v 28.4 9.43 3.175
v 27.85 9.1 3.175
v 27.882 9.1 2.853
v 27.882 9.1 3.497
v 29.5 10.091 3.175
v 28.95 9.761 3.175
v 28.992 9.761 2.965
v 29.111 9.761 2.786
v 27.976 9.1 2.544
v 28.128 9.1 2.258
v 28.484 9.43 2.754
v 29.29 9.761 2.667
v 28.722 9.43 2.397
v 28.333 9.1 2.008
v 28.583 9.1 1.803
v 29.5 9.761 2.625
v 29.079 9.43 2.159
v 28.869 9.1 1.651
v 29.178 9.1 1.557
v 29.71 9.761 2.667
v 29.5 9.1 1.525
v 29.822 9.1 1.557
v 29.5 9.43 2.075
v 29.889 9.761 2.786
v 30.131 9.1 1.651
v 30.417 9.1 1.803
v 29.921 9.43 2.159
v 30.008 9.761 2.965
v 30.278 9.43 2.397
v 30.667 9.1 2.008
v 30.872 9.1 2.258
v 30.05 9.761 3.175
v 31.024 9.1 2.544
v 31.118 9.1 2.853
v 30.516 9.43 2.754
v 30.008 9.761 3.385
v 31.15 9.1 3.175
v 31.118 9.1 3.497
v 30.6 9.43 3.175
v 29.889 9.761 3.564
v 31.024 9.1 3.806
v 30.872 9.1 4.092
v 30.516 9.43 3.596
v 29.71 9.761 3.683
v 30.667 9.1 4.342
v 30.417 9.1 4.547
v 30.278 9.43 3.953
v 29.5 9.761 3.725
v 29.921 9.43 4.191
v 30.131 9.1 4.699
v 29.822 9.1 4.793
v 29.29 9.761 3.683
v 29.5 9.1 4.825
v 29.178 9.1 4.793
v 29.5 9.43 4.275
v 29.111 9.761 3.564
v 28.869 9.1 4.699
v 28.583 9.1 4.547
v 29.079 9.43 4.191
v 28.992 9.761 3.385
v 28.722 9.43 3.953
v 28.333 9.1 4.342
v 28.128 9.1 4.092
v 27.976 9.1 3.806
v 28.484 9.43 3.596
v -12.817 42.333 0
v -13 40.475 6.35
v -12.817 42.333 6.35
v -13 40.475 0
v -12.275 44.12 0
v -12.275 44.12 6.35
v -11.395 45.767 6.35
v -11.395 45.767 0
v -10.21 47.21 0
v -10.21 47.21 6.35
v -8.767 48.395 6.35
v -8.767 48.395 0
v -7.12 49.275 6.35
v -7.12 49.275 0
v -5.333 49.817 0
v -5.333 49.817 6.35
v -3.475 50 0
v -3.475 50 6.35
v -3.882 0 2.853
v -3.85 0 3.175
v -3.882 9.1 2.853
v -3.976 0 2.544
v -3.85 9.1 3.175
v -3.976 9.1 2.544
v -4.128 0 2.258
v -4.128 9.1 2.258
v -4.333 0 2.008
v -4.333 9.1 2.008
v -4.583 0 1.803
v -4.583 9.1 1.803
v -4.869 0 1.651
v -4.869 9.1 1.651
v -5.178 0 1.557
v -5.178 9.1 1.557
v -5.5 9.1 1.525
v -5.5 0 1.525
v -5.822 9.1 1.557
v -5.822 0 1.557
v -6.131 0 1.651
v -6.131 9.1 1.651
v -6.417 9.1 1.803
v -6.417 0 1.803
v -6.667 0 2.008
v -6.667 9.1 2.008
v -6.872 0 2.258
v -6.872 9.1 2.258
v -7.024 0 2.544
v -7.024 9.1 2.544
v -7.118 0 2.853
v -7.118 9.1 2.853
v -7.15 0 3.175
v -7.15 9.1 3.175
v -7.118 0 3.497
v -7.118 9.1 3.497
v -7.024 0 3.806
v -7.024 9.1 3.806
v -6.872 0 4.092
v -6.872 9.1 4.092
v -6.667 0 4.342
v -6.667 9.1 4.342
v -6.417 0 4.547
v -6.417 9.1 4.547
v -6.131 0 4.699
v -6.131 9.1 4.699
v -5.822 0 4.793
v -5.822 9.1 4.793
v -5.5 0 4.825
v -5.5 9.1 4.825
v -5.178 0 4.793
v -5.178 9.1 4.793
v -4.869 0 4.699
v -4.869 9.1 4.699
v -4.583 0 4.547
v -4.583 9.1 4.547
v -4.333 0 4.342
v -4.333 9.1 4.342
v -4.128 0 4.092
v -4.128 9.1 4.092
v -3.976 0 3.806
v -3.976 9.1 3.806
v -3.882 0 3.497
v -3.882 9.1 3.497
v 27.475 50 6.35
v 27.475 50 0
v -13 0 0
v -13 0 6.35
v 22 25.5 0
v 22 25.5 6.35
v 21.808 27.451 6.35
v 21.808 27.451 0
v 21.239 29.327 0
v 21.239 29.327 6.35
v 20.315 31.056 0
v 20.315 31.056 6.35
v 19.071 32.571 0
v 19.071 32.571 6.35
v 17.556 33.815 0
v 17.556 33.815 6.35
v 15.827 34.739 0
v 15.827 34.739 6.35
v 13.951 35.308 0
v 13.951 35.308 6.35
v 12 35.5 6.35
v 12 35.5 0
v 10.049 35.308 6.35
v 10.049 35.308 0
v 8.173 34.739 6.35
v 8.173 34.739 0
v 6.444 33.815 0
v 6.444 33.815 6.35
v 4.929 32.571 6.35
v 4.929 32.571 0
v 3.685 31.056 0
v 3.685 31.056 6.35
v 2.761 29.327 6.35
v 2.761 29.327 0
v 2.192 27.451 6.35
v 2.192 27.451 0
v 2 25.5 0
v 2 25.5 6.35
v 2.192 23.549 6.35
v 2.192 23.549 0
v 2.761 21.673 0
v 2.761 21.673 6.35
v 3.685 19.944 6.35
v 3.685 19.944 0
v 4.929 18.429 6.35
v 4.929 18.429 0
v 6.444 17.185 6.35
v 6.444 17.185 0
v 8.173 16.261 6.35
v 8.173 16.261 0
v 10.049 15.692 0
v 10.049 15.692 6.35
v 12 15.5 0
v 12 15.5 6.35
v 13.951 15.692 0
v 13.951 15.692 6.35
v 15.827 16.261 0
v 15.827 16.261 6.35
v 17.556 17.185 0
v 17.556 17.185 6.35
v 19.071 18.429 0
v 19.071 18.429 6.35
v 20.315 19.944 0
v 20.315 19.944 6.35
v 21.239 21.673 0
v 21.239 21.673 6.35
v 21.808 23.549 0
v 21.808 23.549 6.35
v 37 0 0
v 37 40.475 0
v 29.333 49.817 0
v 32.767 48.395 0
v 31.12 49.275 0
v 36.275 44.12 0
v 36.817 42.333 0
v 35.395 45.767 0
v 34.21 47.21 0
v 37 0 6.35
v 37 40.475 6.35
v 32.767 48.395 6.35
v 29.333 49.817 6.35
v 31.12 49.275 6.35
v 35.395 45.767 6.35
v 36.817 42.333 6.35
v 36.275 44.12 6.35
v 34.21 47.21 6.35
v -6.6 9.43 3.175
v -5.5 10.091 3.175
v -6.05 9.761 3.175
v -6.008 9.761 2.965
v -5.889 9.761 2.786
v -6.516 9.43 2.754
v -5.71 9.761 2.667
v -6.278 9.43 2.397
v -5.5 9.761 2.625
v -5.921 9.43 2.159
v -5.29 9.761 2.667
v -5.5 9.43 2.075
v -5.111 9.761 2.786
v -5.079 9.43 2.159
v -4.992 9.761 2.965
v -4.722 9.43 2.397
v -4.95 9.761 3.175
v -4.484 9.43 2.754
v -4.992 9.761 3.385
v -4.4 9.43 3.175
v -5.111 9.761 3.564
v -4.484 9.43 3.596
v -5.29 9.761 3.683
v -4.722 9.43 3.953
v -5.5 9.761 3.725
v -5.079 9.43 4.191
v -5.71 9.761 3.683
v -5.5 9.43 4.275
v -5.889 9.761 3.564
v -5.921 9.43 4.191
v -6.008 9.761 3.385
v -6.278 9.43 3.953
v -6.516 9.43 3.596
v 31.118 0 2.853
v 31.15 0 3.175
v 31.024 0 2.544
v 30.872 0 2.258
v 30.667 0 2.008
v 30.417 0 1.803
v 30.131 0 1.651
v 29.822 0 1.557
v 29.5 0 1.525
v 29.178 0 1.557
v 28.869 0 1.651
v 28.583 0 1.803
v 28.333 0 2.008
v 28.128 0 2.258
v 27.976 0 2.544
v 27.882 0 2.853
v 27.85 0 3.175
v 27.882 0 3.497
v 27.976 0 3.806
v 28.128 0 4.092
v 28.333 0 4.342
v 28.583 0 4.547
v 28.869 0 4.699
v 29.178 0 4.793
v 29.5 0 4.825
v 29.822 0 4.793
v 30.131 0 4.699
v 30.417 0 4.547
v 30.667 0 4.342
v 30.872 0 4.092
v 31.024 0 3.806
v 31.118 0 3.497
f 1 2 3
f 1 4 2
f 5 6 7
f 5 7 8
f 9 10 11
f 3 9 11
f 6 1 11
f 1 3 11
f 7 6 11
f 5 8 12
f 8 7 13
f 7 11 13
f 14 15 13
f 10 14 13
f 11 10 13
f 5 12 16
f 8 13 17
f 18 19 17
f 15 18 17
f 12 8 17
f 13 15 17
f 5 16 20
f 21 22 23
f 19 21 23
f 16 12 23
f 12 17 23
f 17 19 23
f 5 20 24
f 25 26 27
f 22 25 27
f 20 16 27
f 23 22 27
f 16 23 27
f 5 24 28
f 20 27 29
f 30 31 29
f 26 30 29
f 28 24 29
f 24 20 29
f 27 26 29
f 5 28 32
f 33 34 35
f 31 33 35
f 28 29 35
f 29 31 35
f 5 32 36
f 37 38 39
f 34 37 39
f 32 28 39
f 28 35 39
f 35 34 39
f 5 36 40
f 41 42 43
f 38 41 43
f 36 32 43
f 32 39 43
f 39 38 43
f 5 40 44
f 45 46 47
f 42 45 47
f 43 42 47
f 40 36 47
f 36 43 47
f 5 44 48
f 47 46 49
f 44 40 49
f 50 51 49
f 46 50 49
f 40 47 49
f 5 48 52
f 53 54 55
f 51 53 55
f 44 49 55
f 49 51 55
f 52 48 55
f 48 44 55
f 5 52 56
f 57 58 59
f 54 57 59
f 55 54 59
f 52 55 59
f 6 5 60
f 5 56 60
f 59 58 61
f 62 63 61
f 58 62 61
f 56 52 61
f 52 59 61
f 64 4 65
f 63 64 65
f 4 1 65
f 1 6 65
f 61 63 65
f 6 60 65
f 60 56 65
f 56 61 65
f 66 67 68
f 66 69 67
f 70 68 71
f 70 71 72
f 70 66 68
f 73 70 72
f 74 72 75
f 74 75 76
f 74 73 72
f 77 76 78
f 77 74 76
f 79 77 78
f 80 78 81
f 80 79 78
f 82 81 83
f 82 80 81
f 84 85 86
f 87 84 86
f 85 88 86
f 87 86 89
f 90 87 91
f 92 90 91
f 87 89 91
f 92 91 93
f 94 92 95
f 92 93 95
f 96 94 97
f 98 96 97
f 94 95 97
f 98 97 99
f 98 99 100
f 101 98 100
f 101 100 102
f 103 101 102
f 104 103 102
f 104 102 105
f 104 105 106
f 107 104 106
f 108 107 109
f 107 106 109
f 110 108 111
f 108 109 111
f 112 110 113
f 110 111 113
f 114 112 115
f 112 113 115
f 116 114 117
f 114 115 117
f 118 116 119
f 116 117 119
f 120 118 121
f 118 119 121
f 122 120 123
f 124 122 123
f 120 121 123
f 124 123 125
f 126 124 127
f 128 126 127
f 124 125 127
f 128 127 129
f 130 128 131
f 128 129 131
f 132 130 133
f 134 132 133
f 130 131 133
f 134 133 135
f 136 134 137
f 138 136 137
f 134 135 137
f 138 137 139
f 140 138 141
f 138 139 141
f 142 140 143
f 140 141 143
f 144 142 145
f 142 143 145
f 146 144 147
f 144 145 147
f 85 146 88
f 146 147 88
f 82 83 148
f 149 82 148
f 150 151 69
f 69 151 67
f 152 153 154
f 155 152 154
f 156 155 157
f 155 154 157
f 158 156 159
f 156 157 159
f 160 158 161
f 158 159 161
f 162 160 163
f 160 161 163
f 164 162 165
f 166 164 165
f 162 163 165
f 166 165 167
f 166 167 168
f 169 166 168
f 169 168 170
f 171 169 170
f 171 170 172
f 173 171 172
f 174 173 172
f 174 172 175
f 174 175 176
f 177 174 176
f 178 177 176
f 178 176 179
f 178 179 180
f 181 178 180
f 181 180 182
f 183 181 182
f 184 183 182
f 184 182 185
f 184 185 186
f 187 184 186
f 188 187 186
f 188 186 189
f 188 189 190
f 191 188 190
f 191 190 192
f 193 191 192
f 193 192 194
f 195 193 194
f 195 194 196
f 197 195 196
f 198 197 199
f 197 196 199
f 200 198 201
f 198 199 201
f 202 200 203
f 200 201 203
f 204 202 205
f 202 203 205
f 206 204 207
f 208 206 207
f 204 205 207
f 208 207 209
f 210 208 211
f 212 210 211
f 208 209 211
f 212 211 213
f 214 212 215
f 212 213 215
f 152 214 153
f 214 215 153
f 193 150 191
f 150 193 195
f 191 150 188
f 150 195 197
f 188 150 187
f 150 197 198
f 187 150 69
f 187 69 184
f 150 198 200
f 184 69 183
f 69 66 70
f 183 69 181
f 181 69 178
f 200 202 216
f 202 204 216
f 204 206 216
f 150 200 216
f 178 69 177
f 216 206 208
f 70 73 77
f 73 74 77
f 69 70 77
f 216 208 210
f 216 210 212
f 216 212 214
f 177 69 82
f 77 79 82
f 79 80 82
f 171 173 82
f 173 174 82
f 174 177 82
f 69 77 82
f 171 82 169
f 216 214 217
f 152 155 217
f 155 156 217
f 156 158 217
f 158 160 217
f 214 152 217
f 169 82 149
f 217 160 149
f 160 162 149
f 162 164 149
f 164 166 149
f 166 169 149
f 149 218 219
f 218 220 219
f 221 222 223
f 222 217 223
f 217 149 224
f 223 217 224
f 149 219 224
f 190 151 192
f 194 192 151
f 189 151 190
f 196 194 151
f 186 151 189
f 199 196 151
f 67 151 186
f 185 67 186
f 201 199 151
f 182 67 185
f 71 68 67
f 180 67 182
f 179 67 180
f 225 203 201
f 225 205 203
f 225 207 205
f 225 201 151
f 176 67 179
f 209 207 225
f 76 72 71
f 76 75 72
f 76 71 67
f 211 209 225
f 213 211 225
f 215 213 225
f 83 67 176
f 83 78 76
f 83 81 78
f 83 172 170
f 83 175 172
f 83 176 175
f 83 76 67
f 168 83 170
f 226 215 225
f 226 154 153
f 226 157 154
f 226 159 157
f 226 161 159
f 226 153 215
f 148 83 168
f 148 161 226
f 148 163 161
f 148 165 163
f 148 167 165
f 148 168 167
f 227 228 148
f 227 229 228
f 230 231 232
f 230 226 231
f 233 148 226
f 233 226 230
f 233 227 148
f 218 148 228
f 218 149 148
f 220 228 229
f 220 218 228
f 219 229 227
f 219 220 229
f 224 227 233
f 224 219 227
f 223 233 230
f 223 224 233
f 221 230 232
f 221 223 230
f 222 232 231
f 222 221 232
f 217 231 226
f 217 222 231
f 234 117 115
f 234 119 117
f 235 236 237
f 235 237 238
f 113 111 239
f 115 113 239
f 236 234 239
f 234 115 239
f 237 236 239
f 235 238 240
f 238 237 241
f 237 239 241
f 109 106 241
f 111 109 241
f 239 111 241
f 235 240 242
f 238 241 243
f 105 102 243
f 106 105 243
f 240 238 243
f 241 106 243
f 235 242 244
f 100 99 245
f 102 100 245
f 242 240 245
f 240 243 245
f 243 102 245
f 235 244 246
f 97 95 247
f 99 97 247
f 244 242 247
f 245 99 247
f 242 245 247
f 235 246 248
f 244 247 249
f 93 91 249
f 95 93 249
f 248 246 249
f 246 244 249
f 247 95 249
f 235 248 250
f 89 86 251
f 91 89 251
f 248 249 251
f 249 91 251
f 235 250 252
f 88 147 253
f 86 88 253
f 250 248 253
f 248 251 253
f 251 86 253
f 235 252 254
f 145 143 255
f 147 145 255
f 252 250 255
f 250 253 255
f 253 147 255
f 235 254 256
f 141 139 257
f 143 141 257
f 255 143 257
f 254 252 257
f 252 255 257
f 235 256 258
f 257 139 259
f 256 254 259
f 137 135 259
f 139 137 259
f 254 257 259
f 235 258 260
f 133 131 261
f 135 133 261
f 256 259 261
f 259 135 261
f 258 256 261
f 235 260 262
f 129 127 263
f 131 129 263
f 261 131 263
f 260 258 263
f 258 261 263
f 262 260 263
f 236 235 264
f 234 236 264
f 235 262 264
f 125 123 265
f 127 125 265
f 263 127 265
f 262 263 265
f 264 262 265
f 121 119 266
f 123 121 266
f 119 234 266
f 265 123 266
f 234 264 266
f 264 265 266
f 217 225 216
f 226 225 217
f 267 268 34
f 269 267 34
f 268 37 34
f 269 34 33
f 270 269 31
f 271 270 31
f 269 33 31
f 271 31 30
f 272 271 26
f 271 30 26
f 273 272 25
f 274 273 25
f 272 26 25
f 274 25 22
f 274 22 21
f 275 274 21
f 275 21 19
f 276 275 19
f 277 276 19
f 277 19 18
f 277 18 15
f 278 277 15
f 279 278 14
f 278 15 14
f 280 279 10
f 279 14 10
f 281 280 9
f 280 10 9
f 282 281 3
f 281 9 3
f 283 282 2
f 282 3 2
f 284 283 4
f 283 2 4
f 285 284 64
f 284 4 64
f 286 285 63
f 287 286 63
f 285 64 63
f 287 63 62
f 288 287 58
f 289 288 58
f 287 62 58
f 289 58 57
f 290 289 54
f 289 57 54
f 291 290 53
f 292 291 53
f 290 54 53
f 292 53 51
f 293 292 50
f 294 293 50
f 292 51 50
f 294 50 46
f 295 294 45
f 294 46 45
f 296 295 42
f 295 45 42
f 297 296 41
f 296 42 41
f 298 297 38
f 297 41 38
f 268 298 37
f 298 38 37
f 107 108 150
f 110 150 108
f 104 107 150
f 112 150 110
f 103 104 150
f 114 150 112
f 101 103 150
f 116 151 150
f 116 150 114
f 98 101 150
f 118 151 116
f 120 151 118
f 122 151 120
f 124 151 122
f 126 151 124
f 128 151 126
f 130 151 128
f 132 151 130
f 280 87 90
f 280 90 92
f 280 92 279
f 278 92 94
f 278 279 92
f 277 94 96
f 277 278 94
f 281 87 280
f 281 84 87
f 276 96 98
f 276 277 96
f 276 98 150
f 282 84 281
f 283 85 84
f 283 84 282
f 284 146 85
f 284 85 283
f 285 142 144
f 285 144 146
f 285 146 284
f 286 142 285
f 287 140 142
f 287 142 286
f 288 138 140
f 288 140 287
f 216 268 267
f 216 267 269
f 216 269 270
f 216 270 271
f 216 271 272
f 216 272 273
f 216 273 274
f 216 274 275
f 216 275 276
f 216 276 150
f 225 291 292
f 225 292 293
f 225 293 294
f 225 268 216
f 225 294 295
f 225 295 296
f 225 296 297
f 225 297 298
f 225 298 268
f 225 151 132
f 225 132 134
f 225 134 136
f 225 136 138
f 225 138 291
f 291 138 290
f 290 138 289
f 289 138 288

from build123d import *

# Parameters (mm, degrees)
ESBO_O1_W                        = 50
ESBO_O1_H                        = 50
RESSALTO_EXTRUS_O1_DEPTH         = 6.35
FURO_COM_FOLGA_DE_M131_D         = 20
FURO_DE_DI_METRO_3_3_3_3_2_D     = 3.3
FURO_DE_DI_METRO_3_3_3_3_2_DEPTH = 9.1
FURO_DE_DI_METRO_3_3_3_3_2_TIP   = 0.991420021
FILETE1_R                        = 9.525


with BuildPart() as part:
    # Esboço1 → Ressalto-extrusão1 (new body)
    with BuildSketch(Plane.XY.offset(6.35)):
        with Locations((12, 25)):
            Rectangle(ESBO_O1_W, ESBO_O1_H)
    extrude(amount=-RESSALTO_EXTRUS_O1_DEPTH)

    # Furo com folga de M131 (through all)
    with Locations(Plane(origin=(0, 0, 0), x_dir=(-1, 0, 0), z_dir=(0, 0, -1))):
        with Locations((-12, 25.5)):
            Hole(FURO_COM_FOLGA_DE_M131_D / 2)

    # Furo de diâmetro Ø3.3 (3.3)2
    with Locations(Plane(origin=(0, 0, 0), x_dir=(-1, 0, 0), z_dir=(0, -1, 0))):
        with Locations((5.5, -3.175), (-29.5, -3.175)):
            Hole(FURO_DE_DI_METRO_3_3_3_3_2_D / 2, depth=FURO_DE_DI_METRO_3_3_3_3_2_DEPTH)
            with Locations((0, 0, -(FURO_DE_DI_METRO_3_3_3_3_2_DEPTH + FURO_DE_DI_METRO_3_3_3_3_2_TIP / 2))):  # 118° drill point
                Cone(0, FURO_DE_DI_METRO_3_3_3_3_2_D / 2, FURO_DE_DI_METRO_3_3_3_3_2_TIP, mode=Mode.SUBTRACT)

    # Filete1
    filete1_edges = [part.edges().sort_by_distance(p)[0] for p in [
        (-13, 50, 3.175),
        (37, 50, 3.175),
    ]]
    fillet(filete1_edges, radius=FILETE1_R)


solid = part.part
